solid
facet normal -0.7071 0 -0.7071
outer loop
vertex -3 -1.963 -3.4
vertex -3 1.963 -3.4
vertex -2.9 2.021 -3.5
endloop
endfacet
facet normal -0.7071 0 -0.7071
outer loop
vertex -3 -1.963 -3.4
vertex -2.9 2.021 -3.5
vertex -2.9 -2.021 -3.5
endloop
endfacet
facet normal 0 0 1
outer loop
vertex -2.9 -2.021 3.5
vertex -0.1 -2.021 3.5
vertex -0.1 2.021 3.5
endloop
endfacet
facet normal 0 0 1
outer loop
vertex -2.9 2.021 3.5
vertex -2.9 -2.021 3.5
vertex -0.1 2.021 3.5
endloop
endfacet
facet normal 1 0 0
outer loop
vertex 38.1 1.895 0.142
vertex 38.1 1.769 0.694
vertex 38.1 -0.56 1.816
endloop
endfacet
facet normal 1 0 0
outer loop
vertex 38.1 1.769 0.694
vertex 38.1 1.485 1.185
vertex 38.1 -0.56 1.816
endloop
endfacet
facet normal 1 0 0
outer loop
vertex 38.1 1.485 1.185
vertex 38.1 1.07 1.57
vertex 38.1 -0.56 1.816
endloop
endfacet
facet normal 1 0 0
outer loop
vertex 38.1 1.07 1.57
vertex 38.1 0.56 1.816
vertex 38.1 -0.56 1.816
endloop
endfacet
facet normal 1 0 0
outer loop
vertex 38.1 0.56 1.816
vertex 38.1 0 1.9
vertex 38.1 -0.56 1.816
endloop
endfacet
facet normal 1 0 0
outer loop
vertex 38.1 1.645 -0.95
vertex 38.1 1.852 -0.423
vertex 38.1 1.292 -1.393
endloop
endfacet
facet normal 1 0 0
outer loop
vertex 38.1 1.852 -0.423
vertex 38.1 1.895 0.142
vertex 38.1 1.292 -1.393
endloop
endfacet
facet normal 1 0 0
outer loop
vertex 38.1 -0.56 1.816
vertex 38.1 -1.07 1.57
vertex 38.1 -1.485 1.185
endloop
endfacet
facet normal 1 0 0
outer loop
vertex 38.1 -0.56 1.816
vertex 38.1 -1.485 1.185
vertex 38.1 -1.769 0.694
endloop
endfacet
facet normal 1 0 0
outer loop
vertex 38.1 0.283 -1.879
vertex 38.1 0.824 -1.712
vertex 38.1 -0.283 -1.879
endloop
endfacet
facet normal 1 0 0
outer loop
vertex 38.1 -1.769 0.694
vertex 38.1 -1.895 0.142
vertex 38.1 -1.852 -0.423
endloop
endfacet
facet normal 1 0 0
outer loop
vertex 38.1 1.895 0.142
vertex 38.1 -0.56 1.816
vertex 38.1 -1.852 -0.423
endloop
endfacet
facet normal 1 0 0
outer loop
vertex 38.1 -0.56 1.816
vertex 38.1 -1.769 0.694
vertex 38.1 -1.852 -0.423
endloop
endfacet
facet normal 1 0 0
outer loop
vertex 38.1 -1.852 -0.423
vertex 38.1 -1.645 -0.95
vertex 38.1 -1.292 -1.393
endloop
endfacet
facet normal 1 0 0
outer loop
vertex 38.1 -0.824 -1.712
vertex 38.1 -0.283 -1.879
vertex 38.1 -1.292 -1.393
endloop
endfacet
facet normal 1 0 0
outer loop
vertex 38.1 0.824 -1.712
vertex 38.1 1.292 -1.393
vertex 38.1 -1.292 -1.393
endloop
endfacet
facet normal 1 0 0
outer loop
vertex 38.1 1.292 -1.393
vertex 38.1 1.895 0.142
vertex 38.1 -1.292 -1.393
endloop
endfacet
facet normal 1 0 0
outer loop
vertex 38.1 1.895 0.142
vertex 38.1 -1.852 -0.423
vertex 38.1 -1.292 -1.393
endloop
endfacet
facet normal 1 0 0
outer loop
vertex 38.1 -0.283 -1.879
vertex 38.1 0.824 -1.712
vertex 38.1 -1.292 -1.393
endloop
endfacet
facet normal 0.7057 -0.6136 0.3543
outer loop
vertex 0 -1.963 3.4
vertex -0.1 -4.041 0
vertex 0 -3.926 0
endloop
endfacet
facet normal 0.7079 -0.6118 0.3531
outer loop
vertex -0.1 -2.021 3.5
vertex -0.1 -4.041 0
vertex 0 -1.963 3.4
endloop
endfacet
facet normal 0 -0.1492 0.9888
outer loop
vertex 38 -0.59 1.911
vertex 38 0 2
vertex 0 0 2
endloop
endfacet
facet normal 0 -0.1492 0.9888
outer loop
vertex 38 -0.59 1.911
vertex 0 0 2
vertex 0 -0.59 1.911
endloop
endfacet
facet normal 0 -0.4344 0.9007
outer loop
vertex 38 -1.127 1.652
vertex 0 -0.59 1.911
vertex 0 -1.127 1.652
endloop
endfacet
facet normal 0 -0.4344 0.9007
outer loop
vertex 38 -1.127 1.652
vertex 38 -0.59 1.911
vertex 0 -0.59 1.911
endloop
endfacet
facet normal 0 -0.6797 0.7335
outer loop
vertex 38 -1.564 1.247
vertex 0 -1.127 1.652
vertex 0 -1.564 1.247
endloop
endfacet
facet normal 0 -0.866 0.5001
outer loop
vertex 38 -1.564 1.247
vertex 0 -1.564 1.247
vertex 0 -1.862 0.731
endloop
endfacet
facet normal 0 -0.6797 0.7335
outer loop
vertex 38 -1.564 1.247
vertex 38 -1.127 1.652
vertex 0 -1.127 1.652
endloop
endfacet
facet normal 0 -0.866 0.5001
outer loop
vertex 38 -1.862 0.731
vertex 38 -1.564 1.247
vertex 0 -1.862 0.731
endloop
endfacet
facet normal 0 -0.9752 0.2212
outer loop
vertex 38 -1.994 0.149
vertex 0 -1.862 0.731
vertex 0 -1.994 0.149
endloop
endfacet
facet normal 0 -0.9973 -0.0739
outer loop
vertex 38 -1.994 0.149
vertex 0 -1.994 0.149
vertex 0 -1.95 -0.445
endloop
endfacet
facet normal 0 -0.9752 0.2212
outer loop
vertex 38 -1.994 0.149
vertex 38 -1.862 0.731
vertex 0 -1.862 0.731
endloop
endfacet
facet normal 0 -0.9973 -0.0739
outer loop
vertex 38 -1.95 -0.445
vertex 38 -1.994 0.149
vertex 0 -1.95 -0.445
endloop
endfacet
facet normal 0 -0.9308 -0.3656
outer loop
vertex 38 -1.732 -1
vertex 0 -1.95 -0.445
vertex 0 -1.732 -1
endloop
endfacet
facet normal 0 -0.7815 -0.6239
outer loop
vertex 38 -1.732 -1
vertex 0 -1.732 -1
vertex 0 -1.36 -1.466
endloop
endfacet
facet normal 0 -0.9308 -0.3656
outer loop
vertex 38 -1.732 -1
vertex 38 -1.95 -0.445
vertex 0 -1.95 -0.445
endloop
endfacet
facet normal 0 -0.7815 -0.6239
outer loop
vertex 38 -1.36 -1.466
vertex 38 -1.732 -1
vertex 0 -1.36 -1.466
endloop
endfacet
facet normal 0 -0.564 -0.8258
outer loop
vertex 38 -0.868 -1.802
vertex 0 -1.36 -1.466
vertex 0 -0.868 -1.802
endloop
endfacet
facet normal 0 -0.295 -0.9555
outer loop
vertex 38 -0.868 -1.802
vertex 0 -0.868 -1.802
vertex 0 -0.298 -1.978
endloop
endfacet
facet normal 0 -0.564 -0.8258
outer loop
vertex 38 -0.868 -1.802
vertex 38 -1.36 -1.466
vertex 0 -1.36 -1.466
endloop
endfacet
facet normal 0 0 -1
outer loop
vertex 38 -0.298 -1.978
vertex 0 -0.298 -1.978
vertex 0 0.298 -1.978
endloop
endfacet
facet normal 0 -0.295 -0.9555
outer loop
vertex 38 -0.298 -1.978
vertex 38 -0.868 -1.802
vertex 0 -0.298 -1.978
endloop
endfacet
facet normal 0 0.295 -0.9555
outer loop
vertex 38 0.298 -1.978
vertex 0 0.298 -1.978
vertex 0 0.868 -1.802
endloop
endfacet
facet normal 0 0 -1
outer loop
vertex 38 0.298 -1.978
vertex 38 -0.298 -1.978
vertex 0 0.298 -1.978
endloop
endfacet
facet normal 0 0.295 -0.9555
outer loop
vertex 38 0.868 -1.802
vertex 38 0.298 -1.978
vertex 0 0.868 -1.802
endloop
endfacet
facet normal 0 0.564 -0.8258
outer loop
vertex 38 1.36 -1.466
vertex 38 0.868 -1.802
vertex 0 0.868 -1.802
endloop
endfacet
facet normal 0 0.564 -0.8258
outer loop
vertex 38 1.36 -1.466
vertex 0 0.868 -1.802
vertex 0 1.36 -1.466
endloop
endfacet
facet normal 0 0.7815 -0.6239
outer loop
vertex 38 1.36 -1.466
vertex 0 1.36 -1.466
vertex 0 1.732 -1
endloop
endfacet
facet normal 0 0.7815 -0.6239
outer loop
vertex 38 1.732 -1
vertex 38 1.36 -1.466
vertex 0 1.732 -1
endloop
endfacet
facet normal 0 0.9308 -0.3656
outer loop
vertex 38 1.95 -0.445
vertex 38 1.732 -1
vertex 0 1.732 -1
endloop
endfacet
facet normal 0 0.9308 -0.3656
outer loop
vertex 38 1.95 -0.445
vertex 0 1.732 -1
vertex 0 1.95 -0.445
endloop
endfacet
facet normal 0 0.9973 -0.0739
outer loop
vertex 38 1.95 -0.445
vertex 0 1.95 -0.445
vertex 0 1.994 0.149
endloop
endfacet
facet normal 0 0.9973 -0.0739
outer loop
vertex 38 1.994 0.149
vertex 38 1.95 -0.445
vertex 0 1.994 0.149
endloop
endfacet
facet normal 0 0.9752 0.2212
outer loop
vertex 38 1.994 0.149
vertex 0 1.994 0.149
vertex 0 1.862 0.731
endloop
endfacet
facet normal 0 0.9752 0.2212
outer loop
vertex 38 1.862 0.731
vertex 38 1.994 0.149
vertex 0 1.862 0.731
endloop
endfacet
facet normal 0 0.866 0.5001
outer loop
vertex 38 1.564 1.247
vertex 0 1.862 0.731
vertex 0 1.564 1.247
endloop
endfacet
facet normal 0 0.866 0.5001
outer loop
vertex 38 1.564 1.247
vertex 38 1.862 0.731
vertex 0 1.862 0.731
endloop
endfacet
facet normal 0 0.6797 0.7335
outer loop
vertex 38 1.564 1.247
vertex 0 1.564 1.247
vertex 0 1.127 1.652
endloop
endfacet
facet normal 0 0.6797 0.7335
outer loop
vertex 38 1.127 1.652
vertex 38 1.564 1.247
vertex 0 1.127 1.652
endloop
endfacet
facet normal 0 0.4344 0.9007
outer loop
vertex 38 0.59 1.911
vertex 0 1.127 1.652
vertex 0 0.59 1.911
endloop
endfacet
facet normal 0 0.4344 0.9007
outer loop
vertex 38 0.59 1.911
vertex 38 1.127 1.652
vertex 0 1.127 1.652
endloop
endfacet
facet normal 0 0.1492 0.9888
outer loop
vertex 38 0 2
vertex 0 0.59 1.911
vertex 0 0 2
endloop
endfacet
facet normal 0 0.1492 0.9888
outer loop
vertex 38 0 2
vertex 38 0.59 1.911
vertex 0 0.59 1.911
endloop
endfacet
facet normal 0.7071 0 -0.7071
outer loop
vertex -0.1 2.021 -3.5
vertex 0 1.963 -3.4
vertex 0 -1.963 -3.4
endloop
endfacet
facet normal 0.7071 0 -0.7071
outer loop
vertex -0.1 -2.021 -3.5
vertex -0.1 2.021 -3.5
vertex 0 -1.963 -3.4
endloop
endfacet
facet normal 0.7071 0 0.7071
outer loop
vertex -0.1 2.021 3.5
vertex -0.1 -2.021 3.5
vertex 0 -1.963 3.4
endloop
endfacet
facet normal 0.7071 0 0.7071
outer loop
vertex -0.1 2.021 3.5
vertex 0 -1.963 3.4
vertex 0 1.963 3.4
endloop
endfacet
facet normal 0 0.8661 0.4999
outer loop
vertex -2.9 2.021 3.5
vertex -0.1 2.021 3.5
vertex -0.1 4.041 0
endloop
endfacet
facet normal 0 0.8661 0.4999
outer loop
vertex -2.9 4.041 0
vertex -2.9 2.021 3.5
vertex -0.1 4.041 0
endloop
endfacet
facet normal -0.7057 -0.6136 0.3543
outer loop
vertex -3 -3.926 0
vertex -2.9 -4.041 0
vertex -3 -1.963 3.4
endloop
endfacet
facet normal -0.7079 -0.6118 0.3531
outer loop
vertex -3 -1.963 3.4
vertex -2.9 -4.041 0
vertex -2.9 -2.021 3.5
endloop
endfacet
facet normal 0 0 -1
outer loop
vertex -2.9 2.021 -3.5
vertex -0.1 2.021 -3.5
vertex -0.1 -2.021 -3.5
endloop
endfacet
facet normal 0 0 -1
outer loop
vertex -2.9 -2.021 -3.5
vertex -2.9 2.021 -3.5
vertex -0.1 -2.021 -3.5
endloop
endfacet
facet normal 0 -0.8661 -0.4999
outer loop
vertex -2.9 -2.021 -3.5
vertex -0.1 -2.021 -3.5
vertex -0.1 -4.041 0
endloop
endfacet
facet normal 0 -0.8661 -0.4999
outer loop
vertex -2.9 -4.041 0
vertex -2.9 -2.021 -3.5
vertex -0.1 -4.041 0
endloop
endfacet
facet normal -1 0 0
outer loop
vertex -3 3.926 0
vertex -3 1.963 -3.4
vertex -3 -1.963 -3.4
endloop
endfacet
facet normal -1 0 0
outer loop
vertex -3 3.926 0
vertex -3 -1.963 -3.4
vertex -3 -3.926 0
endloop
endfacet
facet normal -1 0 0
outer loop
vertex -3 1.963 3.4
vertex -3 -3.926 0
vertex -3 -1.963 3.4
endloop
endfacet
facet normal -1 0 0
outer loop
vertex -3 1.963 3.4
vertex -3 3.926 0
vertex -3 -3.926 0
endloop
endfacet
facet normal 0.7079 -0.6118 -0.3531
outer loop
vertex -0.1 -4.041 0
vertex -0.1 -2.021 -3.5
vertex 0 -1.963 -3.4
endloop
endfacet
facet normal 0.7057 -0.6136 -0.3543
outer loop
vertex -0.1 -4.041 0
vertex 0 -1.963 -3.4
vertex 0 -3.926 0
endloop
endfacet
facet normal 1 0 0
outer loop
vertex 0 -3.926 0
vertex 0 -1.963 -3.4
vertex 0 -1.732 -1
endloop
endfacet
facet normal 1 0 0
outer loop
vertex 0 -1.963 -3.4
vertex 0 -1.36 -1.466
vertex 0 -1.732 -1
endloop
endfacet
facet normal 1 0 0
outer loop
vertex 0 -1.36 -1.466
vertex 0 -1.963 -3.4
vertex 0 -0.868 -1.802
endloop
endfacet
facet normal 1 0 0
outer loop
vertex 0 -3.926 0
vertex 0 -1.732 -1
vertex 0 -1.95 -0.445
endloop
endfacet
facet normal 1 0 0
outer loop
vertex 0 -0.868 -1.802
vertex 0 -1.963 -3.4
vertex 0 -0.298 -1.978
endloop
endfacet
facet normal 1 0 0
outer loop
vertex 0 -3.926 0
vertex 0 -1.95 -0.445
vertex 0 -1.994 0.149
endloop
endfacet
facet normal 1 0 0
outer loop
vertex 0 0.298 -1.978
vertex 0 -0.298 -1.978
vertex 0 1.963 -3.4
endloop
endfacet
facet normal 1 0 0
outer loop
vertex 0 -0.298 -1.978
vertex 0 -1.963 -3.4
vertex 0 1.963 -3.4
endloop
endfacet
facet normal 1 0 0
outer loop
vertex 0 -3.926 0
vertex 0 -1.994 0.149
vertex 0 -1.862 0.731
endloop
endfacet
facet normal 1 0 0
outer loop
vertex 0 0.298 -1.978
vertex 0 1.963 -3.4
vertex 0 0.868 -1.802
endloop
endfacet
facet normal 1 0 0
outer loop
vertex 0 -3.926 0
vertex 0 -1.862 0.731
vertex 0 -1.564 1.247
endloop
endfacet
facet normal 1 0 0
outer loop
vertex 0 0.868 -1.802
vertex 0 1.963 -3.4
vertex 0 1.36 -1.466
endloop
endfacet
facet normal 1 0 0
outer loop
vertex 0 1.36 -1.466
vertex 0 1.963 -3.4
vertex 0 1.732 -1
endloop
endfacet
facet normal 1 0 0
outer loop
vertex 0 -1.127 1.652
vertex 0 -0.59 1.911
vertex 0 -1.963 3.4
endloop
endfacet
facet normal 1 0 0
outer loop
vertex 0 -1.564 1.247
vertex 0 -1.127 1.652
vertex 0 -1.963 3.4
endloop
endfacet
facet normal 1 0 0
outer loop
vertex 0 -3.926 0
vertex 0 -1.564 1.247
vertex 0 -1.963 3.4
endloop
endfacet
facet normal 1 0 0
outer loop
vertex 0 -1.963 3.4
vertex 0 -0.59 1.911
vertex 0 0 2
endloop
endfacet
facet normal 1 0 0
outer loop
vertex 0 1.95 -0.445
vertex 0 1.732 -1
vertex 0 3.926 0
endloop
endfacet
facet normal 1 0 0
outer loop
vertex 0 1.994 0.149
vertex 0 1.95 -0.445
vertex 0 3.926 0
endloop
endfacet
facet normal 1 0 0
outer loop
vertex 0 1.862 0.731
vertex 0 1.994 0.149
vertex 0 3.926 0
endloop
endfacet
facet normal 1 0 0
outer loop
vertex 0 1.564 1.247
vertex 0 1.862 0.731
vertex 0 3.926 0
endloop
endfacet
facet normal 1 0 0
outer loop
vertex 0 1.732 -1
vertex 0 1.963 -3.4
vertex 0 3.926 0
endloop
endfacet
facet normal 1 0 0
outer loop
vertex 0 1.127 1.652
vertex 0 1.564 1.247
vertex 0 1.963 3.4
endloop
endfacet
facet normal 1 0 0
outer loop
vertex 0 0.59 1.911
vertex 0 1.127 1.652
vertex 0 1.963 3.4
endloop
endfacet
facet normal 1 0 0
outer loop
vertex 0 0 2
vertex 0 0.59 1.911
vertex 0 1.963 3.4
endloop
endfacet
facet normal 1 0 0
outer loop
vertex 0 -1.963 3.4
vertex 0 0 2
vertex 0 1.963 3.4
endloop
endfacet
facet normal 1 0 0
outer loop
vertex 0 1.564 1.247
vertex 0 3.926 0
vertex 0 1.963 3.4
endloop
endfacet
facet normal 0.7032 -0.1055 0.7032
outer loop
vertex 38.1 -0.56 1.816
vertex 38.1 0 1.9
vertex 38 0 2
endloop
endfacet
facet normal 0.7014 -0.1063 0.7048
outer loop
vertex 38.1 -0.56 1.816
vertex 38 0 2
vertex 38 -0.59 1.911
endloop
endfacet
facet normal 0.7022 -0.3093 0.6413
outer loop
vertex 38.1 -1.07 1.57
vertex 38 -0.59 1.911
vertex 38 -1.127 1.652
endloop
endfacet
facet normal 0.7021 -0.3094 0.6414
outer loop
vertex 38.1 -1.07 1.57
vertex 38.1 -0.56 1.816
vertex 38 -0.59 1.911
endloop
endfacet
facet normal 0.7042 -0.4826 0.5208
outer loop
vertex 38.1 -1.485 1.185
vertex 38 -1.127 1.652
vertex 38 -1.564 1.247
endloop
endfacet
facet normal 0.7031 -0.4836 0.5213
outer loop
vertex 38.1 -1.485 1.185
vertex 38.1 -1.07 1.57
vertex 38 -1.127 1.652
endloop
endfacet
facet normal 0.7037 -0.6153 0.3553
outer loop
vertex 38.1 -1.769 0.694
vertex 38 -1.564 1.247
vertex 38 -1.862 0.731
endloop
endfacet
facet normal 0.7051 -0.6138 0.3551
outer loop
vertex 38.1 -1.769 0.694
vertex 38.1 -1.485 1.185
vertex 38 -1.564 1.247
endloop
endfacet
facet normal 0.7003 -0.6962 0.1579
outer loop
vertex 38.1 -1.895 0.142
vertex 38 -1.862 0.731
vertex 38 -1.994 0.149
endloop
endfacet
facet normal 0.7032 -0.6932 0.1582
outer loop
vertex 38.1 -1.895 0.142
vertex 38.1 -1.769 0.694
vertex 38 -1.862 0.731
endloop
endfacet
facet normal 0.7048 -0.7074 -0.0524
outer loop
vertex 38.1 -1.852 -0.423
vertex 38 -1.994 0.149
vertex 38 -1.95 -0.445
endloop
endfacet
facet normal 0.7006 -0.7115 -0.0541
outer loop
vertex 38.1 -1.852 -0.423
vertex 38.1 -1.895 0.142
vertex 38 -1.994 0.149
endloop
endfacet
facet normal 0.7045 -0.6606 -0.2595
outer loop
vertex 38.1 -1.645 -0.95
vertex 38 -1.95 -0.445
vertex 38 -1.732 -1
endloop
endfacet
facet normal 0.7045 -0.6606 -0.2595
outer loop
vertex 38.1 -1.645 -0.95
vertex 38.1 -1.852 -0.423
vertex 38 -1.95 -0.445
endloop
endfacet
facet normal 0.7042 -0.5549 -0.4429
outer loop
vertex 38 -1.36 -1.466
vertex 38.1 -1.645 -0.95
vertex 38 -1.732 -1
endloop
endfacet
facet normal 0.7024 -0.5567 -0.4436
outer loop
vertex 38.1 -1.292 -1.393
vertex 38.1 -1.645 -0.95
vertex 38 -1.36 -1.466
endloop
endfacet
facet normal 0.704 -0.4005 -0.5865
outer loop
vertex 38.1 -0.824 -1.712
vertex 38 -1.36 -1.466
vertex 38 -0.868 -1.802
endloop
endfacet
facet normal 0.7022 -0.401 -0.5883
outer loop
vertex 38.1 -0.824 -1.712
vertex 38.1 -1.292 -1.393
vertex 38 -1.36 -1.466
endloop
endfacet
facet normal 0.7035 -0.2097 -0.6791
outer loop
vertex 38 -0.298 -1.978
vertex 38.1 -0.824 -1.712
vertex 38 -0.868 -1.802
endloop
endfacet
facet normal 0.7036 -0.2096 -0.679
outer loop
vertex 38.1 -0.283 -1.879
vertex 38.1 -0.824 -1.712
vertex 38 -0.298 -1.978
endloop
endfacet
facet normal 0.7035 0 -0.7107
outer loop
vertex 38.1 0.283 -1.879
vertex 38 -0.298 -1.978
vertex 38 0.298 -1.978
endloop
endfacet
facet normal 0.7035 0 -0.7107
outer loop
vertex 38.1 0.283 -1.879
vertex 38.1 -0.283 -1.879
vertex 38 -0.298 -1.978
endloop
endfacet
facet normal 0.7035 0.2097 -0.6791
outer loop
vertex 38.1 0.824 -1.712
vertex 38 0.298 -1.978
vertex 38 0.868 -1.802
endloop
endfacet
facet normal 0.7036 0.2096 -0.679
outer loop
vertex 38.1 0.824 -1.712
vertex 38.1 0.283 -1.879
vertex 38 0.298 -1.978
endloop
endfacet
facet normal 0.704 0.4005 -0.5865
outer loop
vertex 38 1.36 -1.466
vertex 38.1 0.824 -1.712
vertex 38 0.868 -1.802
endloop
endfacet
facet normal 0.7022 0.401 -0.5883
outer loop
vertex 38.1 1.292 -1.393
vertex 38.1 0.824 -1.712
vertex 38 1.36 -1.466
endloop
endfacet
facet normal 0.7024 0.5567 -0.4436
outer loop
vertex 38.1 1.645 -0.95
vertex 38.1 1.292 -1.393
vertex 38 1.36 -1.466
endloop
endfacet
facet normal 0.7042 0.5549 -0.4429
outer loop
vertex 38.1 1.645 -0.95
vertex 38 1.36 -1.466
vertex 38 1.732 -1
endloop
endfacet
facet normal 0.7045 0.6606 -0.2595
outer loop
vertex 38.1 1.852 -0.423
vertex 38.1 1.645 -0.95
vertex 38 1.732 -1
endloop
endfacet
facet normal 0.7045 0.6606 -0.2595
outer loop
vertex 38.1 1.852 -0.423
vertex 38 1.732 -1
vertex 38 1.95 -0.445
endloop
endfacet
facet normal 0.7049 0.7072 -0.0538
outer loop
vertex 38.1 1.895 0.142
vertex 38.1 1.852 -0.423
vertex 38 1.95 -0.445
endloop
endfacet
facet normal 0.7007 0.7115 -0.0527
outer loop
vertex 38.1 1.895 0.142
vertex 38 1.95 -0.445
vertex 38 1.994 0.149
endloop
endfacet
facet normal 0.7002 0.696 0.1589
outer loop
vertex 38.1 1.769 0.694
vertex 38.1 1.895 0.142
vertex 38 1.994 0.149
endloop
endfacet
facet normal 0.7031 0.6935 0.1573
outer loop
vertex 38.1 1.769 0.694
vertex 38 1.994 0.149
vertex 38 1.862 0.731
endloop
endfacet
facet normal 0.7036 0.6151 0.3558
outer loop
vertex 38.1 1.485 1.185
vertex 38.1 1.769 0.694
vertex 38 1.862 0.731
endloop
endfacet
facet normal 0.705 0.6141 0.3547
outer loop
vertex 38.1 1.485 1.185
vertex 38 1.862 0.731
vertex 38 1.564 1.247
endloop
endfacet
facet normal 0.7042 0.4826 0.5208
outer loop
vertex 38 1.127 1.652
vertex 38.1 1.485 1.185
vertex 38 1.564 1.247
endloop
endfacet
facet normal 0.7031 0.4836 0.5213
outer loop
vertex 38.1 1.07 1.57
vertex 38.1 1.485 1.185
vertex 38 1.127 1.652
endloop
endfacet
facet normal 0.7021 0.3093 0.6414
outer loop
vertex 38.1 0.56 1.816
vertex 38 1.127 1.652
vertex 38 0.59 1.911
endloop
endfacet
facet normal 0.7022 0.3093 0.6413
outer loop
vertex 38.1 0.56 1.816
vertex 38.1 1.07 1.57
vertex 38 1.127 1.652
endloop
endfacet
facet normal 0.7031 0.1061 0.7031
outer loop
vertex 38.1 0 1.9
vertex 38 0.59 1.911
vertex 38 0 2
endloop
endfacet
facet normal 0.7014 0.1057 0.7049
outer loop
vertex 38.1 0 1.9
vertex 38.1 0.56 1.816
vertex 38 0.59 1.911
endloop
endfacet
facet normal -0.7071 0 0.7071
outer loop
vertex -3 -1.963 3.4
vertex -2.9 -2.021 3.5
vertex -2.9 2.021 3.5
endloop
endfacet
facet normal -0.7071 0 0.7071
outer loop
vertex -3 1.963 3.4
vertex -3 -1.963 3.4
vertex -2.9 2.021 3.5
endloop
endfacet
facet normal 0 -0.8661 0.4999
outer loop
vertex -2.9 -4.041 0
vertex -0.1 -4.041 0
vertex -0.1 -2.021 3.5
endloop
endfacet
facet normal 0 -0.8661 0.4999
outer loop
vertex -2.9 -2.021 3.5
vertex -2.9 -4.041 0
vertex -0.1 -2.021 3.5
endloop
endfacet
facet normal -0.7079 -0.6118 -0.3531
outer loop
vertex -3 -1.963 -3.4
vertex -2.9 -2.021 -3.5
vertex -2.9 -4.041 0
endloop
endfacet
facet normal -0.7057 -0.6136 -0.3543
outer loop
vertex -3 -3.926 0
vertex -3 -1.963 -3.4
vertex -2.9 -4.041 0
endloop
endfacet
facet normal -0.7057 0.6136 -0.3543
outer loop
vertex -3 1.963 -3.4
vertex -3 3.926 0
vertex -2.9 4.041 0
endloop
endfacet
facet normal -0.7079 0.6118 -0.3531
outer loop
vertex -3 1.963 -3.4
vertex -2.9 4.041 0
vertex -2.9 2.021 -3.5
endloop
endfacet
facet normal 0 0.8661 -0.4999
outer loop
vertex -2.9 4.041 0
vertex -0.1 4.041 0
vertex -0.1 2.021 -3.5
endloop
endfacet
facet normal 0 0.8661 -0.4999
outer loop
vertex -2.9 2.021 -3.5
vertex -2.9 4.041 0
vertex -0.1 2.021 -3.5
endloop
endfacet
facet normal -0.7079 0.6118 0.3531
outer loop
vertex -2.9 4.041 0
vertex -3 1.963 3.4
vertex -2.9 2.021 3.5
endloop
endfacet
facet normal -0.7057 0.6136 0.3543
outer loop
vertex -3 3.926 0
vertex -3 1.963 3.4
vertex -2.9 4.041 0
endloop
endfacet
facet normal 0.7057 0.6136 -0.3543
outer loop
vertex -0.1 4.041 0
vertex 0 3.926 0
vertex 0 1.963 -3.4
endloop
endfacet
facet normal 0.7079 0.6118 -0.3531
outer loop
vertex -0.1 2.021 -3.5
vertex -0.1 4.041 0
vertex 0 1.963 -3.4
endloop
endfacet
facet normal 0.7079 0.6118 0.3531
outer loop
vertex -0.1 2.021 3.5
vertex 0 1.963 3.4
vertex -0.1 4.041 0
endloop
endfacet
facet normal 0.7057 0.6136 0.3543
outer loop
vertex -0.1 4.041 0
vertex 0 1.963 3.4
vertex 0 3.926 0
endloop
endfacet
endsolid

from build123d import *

# Parameters (mm, degrees)
SKETCH1_W           = 38.1
SKETCH1_H           = 2
BOSS_EXTRUDE1_DEPTH = 3
CHAMFER1_SIZE       = 0.1
CHAMFER2_SIZE       = 0.1


with BuildPart() as part:
    # Sketch1 → Revolve1 (revolve)
    with BuildSketch(Plane.XY, mode=Mode.PRIVATE) as revolve1_sk:
        with Locations((19.05, 1)):
            Rectangle(SKETCH1_W, SKETCH1_H)
    revolve(revolve1_sk.sketch.rotate(Axis((-15.554693394, 0, 0), (1, 0, 0)), 90), axis=Axis((-15.554693394, 0, 0), (1, 0, 0)))

    # Sketch2 → Boss-Extrude1 (add)
    with BuildSketch(Plane.ZY):
        Polygon((0, 4.041451884), (-3.5, 2.020725942), (-3.5, -2.020725942), (0, -4.041451884), (3.5, -2.020725942), (3.5, 2.020725942), align=None)
    extrude(amount=BOSS_EXTRUDE1_DEPTH)

    # Chamfer1
    chamfer1_edges = [part.edges().sort_by_distance(p)[0] for p in [
        (0, 3.031088913, -1.75),
        (0, 0, -3.5),
        (0, -3.031088913, -1.75),
        (0, -3.031088913, 1.75),
        (0, 0, 3.5),
        (-3, 3.031088913, 1.75),
        (-3, 3.031088913, -1.75),
        (-3, 0, -3.5),
        (-3, -3.031088913, -1.75),
        (-3, -3.031088913, 1.75),
        (-3, 0, 3.5),
        (0, 3.031088913, 1.75),
    ]]
    chamfer(chamfer1_edges, length=CHAMFER1_SIZE)

    # Chamfer2
    chamfer2_edges = [part.edges().sort_by_distance(p)[0] for p in [
        (38.1, 0, -2),
    ]]
    chamfer(chamfer2_edges, length=CHAMFER2_SIZE)


solid = part.part
